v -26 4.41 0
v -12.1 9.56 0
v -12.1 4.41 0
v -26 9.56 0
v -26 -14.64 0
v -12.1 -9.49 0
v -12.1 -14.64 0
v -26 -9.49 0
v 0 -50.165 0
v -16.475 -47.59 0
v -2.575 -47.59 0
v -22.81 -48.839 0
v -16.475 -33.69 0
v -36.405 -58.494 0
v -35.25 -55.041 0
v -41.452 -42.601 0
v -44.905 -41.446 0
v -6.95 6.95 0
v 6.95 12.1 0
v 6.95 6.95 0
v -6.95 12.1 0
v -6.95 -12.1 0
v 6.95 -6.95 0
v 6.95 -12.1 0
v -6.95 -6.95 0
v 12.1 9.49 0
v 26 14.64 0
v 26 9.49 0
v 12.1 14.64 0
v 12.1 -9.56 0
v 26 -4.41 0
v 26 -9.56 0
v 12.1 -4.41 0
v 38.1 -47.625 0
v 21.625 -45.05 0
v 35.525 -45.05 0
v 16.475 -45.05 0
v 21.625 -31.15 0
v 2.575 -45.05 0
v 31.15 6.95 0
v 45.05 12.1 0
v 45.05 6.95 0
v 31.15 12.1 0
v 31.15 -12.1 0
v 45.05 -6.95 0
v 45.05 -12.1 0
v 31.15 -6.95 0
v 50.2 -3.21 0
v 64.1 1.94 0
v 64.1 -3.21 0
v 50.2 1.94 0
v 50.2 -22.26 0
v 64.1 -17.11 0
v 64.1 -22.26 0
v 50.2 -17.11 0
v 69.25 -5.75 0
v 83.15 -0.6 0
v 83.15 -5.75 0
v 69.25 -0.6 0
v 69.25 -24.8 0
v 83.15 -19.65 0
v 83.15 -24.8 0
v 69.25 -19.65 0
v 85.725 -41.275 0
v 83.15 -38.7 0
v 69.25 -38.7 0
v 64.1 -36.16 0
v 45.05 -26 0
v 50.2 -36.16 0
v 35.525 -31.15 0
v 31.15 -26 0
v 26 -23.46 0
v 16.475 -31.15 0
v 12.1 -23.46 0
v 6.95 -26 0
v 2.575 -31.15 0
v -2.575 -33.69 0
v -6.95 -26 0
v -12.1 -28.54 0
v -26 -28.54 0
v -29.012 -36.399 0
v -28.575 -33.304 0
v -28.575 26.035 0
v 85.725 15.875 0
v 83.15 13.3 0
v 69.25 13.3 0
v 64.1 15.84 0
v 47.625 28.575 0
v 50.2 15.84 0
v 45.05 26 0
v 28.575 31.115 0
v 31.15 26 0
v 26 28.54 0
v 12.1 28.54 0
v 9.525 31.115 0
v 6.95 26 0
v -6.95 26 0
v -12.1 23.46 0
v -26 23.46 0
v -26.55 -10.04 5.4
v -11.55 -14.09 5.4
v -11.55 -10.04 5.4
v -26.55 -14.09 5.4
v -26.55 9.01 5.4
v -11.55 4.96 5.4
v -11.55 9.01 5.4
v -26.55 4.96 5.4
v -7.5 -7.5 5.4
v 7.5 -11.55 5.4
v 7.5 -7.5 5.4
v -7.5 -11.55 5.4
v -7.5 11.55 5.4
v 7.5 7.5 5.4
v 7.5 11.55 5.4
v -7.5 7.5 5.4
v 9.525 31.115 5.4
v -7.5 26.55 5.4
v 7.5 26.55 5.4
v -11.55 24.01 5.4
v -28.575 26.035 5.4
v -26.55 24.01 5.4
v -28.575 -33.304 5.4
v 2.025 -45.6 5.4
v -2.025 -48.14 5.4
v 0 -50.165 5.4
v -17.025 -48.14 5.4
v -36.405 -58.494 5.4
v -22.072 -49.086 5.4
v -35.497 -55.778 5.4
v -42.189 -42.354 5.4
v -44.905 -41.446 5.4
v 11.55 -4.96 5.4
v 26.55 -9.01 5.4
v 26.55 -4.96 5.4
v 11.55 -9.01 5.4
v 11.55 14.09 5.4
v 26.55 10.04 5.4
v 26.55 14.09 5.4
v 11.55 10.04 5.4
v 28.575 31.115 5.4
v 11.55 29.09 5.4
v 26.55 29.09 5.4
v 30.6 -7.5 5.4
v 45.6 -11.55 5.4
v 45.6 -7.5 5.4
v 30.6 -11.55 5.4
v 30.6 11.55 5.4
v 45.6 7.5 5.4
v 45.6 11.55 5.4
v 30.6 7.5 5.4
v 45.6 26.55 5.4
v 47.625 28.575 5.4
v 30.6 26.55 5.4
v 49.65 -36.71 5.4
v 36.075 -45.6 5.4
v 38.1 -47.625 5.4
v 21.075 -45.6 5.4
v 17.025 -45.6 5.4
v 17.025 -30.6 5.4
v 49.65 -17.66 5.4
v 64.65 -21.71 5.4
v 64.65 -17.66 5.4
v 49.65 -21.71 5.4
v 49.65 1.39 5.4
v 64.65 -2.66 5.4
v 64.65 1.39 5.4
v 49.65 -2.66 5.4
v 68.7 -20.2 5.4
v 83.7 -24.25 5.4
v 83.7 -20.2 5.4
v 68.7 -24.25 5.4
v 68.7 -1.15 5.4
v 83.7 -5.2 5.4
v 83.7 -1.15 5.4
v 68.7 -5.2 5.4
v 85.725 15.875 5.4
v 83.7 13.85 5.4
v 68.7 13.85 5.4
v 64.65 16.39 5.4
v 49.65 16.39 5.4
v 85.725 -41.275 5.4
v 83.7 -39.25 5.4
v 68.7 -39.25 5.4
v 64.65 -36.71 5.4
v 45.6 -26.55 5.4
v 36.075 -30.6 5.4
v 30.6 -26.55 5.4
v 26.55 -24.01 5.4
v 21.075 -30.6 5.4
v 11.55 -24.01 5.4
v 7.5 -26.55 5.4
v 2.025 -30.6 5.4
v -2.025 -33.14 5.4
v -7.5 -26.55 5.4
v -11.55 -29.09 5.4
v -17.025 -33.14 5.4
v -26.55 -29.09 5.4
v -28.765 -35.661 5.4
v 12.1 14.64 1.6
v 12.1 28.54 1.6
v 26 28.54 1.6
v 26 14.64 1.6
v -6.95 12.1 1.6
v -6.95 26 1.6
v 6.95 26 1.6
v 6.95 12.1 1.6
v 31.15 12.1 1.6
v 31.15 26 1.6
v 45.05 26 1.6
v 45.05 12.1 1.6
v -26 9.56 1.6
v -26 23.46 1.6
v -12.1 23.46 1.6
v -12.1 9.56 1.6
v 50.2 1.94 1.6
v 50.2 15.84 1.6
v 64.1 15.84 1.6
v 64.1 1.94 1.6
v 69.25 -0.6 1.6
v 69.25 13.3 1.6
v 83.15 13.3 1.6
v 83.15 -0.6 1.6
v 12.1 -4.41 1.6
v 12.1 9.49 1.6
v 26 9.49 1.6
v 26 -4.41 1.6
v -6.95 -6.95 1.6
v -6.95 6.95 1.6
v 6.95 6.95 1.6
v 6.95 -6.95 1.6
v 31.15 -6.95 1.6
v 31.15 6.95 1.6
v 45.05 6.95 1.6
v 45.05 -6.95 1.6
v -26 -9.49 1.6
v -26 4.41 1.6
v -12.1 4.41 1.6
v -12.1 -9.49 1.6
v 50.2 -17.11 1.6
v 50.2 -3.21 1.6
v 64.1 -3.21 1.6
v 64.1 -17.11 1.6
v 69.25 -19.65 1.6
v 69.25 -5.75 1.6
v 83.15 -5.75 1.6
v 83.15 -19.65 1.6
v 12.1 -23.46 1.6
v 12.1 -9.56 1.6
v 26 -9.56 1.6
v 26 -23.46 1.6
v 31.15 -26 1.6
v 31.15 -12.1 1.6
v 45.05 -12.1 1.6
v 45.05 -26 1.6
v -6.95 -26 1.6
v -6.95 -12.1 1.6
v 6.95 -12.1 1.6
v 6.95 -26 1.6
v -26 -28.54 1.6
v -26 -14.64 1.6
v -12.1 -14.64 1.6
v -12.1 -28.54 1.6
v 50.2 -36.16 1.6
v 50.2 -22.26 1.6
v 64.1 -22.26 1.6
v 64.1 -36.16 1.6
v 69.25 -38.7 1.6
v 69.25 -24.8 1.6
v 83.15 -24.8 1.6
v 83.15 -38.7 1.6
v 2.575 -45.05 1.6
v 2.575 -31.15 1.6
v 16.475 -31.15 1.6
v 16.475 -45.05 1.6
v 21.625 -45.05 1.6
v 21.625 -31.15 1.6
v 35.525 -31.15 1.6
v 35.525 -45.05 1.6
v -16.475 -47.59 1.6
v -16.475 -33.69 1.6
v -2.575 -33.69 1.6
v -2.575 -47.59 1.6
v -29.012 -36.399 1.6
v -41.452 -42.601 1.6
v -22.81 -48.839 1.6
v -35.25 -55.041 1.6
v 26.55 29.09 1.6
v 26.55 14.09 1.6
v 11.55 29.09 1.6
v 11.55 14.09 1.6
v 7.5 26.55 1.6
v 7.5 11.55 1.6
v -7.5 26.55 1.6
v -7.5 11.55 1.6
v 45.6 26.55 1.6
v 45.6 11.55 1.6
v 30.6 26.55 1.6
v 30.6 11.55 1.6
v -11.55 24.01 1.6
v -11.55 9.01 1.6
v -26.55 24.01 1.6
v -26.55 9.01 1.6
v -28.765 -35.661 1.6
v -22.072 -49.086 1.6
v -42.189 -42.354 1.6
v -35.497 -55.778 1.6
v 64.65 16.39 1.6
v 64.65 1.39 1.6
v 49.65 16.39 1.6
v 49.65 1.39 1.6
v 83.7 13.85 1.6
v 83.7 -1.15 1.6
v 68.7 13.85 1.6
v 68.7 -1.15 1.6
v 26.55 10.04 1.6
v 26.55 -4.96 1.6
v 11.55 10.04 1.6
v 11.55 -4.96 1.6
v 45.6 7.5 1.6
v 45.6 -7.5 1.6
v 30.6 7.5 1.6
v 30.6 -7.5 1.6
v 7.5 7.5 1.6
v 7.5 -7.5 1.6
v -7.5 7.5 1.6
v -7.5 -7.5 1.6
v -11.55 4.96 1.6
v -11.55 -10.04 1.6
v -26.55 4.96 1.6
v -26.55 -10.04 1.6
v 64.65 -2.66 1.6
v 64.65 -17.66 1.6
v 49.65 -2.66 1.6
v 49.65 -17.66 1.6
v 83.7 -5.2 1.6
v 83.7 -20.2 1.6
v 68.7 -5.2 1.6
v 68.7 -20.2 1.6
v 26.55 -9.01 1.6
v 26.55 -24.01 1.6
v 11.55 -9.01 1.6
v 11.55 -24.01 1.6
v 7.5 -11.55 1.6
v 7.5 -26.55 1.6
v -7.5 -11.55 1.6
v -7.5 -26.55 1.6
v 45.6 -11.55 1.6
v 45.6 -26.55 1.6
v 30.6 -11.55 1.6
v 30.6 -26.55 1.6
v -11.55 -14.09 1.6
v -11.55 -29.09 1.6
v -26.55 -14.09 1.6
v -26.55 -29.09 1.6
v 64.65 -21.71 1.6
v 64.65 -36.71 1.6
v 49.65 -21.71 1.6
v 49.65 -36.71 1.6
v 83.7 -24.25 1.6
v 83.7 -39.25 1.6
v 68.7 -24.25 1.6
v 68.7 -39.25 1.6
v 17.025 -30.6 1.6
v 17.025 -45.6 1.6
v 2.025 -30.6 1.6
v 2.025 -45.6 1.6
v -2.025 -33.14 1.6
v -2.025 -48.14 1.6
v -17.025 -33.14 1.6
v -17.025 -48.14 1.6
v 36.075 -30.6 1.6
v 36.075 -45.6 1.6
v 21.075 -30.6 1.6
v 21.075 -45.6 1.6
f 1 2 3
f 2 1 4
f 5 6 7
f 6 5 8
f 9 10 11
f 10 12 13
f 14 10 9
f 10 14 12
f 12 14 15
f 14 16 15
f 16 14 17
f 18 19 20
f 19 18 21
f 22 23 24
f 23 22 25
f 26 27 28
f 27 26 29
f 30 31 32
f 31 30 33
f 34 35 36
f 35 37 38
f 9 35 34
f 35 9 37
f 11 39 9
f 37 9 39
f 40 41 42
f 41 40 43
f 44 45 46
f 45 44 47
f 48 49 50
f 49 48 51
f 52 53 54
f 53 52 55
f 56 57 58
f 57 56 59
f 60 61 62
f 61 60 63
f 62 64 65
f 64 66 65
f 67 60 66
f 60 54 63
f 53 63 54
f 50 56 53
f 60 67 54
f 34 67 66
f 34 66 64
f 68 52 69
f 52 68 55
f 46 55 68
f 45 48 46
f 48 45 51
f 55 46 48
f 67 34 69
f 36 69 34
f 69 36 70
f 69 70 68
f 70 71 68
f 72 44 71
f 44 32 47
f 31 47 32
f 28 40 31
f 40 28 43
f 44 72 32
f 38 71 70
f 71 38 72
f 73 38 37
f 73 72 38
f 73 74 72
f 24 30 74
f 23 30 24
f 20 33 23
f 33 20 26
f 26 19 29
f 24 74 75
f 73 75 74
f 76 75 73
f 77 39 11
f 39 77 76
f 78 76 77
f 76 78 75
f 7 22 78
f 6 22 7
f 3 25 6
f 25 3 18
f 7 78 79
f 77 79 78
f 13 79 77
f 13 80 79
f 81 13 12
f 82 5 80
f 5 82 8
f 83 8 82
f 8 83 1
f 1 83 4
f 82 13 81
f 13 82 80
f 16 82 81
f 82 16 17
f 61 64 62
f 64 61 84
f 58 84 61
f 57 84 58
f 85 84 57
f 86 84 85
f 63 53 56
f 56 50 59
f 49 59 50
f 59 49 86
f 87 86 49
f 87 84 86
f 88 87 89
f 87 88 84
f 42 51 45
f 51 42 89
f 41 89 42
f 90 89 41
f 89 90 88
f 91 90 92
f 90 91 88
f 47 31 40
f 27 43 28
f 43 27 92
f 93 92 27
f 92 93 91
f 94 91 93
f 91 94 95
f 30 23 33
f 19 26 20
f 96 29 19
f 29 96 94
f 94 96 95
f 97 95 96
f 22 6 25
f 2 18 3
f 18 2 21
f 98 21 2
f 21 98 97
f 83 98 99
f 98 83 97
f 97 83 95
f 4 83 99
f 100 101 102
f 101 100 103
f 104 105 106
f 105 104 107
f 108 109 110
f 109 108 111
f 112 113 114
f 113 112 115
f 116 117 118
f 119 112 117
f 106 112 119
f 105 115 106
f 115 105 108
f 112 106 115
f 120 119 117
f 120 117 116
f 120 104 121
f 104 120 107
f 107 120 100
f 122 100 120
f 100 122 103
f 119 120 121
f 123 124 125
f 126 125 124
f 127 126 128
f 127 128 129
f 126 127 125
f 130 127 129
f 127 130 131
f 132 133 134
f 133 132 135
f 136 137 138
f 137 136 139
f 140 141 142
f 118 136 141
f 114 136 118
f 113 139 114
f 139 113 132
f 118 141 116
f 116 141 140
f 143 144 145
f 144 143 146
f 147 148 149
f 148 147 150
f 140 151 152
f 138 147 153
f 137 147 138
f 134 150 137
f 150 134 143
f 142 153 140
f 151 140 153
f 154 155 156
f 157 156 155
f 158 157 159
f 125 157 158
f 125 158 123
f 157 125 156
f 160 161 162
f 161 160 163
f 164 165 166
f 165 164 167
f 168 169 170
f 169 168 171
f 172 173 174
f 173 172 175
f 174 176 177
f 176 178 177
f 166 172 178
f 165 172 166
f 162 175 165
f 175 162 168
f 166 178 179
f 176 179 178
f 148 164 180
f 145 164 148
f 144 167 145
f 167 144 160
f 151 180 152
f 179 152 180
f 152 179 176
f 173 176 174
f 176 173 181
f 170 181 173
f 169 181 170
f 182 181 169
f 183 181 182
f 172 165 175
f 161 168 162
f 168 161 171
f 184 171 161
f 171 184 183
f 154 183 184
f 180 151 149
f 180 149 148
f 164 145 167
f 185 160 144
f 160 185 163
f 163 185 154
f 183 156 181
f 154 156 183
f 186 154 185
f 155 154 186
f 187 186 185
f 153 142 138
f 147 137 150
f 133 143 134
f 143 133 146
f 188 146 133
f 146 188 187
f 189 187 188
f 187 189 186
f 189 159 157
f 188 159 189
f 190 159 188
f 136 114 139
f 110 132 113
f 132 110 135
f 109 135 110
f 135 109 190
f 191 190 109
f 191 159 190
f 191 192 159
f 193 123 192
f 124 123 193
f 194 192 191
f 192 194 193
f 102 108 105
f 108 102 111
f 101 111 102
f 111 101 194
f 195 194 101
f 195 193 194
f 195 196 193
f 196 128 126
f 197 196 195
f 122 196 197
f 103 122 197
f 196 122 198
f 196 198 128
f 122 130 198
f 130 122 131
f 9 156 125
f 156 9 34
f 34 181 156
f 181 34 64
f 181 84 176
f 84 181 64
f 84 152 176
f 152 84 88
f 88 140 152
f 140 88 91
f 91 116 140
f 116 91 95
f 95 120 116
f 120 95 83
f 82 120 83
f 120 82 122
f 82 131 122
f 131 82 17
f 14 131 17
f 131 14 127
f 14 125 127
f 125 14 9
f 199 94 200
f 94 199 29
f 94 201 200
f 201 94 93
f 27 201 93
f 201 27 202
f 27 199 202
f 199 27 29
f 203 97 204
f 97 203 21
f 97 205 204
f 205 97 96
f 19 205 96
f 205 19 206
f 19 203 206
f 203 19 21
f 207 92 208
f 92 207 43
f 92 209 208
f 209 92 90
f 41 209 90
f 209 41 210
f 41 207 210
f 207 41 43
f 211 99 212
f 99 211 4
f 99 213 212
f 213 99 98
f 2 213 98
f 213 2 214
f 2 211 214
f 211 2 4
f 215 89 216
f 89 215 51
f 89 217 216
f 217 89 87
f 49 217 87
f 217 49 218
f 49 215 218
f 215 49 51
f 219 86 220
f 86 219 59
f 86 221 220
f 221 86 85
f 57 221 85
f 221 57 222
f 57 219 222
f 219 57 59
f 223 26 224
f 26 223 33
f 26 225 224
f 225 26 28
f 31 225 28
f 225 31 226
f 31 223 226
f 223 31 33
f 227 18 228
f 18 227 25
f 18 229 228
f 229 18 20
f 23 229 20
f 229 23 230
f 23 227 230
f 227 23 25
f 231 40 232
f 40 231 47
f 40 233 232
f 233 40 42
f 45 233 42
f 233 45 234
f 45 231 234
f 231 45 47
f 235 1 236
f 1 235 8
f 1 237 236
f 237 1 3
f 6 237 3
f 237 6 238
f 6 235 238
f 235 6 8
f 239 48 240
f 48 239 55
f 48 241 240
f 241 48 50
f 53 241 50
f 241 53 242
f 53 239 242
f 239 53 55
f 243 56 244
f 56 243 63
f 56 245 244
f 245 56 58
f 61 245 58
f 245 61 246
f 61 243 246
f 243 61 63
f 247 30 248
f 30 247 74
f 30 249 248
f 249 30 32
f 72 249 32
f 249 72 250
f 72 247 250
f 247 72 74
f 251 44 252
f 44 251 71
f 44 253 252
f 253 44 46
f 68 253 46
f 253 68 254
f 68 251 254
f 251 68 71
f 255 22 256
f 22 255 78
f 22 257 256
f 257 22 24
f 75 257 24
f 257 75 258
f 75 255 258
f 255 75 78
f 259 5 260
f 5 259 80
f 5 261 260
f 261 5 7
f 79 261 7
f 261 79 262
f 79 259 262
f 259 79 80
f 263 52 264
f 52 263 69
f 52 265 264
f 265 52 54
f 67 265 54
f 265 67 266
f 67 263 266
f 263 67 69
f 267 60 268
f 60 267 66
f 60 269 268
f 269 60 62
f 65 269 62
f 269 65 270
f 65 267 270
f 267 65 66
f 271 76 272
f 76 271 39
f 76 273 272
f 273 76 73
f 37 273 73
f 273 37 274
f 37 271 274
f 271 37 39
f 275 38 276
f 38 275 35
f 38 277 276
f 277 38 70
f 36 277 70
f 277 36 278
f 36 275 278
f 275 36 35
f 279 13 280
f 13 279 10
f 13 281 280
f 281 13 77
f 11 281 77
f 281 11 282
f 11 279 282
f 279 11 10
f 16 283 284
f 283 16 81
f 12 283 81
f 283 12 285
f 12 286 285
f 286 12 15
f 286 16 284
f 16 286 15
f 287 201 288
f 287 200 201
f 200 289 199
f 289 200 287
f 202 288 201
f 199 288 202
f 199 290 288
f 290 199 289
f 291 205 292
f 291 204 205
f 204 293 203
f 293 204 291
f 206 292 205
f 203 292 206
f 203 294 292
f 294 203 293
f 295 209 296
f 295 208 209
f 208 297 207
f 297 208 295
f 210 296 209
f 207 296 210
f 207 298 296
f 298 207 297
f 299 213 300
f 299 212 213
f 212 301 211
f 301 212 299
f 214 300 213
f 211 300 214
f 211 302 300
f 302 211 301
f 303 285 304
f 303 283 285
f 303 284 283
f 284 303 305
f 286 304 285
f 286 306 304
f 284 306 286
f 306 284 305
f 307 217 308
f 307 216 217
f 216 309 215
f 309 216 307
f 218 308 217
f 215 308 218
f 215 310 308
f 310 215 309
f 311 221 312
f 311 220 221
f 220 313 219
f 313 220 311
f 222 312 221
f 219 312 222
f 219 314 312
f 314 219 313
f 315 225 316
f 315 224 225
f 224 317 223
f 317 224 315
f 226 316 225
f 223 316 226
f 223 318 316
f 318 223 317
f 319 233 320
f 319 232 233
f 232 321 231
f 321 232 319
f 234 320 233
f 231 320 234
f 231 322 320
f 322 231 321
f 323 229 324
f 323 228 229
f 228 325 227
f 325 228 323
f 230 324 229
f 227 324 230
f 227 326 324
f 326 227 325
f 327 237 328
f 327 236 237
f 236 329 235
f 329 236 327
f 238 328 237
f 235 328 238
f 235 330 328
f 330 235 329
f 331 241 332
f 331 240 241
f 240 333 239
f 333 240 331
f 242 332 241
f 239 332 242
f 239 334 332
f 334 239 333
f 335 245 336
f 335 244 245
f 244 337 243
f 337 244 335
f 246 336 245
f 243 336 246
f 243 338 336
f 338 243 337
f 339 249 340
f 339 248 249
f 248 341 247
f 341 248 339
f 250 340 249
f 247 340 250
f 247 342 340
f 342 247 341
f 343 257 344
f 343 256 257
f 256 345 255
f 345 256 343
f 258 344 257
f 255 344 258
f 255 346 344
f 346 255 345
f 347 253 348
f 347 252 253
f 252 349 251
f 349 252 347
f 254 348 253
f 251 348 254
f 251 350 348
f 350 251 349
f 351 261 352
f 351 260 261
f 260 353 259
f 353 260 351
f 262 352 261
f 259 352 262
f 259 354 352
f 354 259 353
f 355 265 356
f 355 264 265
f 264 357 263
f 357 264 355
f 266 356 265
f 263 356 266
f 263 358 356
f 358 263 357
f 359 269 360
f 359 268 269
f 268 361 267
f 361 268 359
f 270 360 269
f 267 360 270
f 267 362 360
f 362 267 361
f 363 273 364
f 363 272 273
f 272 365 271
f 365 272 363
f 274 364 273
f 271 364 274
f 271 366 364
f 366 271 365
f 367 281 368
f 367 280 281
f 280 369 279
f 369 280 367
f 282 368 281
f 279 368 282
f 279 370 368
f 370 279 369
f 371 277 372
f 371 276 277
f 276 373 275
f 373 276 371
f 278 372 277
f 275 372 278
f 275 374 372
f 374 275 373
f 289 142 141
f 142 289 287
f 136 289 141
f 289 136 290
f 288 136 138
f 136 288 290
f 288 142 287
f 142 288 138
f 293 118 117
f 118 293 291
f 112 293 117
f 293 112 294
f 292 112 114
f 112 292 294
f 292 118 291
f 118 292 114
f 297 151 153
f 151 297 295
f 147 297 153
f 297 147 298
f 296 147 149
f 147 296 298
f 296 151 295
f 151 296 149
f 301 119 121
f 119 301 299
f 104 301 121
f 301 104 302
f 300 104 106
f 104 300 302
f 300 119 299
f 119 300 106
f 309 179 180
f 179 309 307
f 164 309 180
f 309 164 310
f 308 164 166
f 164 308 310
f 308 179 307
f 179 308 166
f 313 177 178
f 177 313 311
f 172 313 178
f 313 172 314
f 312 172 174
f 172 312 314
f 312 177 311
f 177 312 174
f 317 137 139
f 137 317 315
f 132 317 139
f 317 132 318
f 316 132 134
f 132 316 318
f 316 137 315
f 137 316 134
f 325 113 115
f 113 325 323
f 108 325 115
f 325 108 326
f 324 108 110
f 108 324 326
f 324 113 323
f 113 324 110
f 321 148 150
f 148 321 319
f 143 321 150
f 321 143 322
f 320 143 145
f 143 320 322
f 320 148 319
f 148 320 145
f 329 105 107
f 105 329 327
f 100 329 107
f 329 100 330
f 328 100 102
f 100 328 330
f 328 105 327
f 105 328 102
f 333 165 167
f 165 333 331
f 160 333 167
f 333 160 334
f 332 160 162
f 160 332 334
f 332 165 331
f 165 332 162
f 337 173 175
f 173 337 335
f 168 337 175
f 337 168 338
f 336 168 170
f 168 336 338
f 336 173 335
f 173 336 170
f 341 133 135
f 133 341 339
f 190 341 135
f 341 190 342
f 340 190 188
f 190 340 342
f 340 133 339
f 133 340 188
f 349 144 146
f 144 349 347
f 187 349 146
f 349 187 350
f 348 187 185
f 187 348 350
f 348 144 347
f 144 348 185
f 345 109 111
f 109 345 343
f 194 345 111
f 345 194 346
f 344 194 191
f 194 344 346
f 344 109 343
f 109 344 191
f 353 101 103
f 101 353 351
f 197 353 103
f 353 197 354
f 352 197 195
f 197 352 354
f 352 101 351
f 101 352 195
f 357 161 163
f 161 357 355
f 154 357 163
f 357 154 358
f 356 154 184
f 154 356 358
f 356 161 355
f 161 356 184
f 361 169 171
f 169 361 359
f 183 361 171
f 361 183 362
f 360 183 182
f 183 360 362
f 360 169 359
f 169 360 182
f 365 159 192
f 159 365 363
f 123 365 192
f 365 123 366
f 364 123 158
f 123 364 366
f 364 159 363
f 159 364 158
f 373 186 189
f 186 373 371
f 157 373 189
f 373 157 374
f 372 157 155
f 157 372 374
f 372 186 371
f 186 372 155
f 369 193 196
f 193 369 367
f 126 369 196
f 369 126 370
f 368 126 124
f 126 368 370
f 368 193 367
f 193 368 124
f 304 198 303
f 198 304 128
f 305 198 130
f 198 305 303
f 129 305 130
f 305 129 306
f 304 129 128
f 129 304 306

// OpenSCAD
// file: functions.scad
// You can change the parameters in the header in openscad, then
// render, and then export in the format you need.
//
// You can also include this file in your own scad file, and use the
// modules to create your own case:
//  - outline module (2D outline of the plate),
//  - plate module (2D draw of the plate, with switch holes),
//  - key_placement module (2D placement of the keys centered, to be
//    used with children) to create your own case.

switch_hole=13.9;// by spec should be 14, can be adjusted for printer imprecision

// Code here, not to be modified if you want keyseebee compatibility
inter_switch=19.05;
d=2.54;
delta=[-d,0,d,0,-4*d,-5*d];// column stagger

// this is a bug in v0.1 and v0.2, not needed after
right_thumb_offset=0.635;
function thumb_offset(is_right) = (is_right?1:0)*right_thumb_offset;

module key_placement_without_extreme(is_right=false) {
     for (i=[0:5]) for (j=[0:2]) translate([(i-1)*inter_switch, -(j-1)*inter_switch+delta[i]]) children();
     for (i=[0:2]) translate([(i-0.5)*inter_switch+thumb_offset(is_right), -2*inter_switch+min(delta[i], delta[i+1])]) children();
}

module extreme_key_placement(is_right=false) {
     translate([-32.131+thumb_offset(is_right), -45.720]) rotate(26.5) children();
}

module key_placement(is_right=false) {
     key_placement_without_extreme(is_right) children();
     extreme_key_placement(is_right) children();
}

module outline(is_right=false) {
     union() {
          hull() key_placement_without_extreme(is_right) square(inter_switch, center=true);
          translate([-inter_switch, -2*inter_switch+delta[0]]) square(inter_switch, center=true);
          hull() {
               extreme_key_placement(is_right) square(inter_switch, center=true);
               translate([-0.5*inter_switch+thumb_offset(is_right), -2*inter_switch+delta[0]]) square(inter_switch, center=true);
          }
     }
}

module plate(is_right=false) {
     difference() {
          outline(is_right);
          key_placement(is_right) square([switch_hole, switch_hole], center=true);
     }
}
// main file
use <functions.scad>

difference() {
     linear_extrude(5.4) plate();
     translate([0,0,1.6]) linear_extrude(5.4) key_placement() square(15, center=true);
}
